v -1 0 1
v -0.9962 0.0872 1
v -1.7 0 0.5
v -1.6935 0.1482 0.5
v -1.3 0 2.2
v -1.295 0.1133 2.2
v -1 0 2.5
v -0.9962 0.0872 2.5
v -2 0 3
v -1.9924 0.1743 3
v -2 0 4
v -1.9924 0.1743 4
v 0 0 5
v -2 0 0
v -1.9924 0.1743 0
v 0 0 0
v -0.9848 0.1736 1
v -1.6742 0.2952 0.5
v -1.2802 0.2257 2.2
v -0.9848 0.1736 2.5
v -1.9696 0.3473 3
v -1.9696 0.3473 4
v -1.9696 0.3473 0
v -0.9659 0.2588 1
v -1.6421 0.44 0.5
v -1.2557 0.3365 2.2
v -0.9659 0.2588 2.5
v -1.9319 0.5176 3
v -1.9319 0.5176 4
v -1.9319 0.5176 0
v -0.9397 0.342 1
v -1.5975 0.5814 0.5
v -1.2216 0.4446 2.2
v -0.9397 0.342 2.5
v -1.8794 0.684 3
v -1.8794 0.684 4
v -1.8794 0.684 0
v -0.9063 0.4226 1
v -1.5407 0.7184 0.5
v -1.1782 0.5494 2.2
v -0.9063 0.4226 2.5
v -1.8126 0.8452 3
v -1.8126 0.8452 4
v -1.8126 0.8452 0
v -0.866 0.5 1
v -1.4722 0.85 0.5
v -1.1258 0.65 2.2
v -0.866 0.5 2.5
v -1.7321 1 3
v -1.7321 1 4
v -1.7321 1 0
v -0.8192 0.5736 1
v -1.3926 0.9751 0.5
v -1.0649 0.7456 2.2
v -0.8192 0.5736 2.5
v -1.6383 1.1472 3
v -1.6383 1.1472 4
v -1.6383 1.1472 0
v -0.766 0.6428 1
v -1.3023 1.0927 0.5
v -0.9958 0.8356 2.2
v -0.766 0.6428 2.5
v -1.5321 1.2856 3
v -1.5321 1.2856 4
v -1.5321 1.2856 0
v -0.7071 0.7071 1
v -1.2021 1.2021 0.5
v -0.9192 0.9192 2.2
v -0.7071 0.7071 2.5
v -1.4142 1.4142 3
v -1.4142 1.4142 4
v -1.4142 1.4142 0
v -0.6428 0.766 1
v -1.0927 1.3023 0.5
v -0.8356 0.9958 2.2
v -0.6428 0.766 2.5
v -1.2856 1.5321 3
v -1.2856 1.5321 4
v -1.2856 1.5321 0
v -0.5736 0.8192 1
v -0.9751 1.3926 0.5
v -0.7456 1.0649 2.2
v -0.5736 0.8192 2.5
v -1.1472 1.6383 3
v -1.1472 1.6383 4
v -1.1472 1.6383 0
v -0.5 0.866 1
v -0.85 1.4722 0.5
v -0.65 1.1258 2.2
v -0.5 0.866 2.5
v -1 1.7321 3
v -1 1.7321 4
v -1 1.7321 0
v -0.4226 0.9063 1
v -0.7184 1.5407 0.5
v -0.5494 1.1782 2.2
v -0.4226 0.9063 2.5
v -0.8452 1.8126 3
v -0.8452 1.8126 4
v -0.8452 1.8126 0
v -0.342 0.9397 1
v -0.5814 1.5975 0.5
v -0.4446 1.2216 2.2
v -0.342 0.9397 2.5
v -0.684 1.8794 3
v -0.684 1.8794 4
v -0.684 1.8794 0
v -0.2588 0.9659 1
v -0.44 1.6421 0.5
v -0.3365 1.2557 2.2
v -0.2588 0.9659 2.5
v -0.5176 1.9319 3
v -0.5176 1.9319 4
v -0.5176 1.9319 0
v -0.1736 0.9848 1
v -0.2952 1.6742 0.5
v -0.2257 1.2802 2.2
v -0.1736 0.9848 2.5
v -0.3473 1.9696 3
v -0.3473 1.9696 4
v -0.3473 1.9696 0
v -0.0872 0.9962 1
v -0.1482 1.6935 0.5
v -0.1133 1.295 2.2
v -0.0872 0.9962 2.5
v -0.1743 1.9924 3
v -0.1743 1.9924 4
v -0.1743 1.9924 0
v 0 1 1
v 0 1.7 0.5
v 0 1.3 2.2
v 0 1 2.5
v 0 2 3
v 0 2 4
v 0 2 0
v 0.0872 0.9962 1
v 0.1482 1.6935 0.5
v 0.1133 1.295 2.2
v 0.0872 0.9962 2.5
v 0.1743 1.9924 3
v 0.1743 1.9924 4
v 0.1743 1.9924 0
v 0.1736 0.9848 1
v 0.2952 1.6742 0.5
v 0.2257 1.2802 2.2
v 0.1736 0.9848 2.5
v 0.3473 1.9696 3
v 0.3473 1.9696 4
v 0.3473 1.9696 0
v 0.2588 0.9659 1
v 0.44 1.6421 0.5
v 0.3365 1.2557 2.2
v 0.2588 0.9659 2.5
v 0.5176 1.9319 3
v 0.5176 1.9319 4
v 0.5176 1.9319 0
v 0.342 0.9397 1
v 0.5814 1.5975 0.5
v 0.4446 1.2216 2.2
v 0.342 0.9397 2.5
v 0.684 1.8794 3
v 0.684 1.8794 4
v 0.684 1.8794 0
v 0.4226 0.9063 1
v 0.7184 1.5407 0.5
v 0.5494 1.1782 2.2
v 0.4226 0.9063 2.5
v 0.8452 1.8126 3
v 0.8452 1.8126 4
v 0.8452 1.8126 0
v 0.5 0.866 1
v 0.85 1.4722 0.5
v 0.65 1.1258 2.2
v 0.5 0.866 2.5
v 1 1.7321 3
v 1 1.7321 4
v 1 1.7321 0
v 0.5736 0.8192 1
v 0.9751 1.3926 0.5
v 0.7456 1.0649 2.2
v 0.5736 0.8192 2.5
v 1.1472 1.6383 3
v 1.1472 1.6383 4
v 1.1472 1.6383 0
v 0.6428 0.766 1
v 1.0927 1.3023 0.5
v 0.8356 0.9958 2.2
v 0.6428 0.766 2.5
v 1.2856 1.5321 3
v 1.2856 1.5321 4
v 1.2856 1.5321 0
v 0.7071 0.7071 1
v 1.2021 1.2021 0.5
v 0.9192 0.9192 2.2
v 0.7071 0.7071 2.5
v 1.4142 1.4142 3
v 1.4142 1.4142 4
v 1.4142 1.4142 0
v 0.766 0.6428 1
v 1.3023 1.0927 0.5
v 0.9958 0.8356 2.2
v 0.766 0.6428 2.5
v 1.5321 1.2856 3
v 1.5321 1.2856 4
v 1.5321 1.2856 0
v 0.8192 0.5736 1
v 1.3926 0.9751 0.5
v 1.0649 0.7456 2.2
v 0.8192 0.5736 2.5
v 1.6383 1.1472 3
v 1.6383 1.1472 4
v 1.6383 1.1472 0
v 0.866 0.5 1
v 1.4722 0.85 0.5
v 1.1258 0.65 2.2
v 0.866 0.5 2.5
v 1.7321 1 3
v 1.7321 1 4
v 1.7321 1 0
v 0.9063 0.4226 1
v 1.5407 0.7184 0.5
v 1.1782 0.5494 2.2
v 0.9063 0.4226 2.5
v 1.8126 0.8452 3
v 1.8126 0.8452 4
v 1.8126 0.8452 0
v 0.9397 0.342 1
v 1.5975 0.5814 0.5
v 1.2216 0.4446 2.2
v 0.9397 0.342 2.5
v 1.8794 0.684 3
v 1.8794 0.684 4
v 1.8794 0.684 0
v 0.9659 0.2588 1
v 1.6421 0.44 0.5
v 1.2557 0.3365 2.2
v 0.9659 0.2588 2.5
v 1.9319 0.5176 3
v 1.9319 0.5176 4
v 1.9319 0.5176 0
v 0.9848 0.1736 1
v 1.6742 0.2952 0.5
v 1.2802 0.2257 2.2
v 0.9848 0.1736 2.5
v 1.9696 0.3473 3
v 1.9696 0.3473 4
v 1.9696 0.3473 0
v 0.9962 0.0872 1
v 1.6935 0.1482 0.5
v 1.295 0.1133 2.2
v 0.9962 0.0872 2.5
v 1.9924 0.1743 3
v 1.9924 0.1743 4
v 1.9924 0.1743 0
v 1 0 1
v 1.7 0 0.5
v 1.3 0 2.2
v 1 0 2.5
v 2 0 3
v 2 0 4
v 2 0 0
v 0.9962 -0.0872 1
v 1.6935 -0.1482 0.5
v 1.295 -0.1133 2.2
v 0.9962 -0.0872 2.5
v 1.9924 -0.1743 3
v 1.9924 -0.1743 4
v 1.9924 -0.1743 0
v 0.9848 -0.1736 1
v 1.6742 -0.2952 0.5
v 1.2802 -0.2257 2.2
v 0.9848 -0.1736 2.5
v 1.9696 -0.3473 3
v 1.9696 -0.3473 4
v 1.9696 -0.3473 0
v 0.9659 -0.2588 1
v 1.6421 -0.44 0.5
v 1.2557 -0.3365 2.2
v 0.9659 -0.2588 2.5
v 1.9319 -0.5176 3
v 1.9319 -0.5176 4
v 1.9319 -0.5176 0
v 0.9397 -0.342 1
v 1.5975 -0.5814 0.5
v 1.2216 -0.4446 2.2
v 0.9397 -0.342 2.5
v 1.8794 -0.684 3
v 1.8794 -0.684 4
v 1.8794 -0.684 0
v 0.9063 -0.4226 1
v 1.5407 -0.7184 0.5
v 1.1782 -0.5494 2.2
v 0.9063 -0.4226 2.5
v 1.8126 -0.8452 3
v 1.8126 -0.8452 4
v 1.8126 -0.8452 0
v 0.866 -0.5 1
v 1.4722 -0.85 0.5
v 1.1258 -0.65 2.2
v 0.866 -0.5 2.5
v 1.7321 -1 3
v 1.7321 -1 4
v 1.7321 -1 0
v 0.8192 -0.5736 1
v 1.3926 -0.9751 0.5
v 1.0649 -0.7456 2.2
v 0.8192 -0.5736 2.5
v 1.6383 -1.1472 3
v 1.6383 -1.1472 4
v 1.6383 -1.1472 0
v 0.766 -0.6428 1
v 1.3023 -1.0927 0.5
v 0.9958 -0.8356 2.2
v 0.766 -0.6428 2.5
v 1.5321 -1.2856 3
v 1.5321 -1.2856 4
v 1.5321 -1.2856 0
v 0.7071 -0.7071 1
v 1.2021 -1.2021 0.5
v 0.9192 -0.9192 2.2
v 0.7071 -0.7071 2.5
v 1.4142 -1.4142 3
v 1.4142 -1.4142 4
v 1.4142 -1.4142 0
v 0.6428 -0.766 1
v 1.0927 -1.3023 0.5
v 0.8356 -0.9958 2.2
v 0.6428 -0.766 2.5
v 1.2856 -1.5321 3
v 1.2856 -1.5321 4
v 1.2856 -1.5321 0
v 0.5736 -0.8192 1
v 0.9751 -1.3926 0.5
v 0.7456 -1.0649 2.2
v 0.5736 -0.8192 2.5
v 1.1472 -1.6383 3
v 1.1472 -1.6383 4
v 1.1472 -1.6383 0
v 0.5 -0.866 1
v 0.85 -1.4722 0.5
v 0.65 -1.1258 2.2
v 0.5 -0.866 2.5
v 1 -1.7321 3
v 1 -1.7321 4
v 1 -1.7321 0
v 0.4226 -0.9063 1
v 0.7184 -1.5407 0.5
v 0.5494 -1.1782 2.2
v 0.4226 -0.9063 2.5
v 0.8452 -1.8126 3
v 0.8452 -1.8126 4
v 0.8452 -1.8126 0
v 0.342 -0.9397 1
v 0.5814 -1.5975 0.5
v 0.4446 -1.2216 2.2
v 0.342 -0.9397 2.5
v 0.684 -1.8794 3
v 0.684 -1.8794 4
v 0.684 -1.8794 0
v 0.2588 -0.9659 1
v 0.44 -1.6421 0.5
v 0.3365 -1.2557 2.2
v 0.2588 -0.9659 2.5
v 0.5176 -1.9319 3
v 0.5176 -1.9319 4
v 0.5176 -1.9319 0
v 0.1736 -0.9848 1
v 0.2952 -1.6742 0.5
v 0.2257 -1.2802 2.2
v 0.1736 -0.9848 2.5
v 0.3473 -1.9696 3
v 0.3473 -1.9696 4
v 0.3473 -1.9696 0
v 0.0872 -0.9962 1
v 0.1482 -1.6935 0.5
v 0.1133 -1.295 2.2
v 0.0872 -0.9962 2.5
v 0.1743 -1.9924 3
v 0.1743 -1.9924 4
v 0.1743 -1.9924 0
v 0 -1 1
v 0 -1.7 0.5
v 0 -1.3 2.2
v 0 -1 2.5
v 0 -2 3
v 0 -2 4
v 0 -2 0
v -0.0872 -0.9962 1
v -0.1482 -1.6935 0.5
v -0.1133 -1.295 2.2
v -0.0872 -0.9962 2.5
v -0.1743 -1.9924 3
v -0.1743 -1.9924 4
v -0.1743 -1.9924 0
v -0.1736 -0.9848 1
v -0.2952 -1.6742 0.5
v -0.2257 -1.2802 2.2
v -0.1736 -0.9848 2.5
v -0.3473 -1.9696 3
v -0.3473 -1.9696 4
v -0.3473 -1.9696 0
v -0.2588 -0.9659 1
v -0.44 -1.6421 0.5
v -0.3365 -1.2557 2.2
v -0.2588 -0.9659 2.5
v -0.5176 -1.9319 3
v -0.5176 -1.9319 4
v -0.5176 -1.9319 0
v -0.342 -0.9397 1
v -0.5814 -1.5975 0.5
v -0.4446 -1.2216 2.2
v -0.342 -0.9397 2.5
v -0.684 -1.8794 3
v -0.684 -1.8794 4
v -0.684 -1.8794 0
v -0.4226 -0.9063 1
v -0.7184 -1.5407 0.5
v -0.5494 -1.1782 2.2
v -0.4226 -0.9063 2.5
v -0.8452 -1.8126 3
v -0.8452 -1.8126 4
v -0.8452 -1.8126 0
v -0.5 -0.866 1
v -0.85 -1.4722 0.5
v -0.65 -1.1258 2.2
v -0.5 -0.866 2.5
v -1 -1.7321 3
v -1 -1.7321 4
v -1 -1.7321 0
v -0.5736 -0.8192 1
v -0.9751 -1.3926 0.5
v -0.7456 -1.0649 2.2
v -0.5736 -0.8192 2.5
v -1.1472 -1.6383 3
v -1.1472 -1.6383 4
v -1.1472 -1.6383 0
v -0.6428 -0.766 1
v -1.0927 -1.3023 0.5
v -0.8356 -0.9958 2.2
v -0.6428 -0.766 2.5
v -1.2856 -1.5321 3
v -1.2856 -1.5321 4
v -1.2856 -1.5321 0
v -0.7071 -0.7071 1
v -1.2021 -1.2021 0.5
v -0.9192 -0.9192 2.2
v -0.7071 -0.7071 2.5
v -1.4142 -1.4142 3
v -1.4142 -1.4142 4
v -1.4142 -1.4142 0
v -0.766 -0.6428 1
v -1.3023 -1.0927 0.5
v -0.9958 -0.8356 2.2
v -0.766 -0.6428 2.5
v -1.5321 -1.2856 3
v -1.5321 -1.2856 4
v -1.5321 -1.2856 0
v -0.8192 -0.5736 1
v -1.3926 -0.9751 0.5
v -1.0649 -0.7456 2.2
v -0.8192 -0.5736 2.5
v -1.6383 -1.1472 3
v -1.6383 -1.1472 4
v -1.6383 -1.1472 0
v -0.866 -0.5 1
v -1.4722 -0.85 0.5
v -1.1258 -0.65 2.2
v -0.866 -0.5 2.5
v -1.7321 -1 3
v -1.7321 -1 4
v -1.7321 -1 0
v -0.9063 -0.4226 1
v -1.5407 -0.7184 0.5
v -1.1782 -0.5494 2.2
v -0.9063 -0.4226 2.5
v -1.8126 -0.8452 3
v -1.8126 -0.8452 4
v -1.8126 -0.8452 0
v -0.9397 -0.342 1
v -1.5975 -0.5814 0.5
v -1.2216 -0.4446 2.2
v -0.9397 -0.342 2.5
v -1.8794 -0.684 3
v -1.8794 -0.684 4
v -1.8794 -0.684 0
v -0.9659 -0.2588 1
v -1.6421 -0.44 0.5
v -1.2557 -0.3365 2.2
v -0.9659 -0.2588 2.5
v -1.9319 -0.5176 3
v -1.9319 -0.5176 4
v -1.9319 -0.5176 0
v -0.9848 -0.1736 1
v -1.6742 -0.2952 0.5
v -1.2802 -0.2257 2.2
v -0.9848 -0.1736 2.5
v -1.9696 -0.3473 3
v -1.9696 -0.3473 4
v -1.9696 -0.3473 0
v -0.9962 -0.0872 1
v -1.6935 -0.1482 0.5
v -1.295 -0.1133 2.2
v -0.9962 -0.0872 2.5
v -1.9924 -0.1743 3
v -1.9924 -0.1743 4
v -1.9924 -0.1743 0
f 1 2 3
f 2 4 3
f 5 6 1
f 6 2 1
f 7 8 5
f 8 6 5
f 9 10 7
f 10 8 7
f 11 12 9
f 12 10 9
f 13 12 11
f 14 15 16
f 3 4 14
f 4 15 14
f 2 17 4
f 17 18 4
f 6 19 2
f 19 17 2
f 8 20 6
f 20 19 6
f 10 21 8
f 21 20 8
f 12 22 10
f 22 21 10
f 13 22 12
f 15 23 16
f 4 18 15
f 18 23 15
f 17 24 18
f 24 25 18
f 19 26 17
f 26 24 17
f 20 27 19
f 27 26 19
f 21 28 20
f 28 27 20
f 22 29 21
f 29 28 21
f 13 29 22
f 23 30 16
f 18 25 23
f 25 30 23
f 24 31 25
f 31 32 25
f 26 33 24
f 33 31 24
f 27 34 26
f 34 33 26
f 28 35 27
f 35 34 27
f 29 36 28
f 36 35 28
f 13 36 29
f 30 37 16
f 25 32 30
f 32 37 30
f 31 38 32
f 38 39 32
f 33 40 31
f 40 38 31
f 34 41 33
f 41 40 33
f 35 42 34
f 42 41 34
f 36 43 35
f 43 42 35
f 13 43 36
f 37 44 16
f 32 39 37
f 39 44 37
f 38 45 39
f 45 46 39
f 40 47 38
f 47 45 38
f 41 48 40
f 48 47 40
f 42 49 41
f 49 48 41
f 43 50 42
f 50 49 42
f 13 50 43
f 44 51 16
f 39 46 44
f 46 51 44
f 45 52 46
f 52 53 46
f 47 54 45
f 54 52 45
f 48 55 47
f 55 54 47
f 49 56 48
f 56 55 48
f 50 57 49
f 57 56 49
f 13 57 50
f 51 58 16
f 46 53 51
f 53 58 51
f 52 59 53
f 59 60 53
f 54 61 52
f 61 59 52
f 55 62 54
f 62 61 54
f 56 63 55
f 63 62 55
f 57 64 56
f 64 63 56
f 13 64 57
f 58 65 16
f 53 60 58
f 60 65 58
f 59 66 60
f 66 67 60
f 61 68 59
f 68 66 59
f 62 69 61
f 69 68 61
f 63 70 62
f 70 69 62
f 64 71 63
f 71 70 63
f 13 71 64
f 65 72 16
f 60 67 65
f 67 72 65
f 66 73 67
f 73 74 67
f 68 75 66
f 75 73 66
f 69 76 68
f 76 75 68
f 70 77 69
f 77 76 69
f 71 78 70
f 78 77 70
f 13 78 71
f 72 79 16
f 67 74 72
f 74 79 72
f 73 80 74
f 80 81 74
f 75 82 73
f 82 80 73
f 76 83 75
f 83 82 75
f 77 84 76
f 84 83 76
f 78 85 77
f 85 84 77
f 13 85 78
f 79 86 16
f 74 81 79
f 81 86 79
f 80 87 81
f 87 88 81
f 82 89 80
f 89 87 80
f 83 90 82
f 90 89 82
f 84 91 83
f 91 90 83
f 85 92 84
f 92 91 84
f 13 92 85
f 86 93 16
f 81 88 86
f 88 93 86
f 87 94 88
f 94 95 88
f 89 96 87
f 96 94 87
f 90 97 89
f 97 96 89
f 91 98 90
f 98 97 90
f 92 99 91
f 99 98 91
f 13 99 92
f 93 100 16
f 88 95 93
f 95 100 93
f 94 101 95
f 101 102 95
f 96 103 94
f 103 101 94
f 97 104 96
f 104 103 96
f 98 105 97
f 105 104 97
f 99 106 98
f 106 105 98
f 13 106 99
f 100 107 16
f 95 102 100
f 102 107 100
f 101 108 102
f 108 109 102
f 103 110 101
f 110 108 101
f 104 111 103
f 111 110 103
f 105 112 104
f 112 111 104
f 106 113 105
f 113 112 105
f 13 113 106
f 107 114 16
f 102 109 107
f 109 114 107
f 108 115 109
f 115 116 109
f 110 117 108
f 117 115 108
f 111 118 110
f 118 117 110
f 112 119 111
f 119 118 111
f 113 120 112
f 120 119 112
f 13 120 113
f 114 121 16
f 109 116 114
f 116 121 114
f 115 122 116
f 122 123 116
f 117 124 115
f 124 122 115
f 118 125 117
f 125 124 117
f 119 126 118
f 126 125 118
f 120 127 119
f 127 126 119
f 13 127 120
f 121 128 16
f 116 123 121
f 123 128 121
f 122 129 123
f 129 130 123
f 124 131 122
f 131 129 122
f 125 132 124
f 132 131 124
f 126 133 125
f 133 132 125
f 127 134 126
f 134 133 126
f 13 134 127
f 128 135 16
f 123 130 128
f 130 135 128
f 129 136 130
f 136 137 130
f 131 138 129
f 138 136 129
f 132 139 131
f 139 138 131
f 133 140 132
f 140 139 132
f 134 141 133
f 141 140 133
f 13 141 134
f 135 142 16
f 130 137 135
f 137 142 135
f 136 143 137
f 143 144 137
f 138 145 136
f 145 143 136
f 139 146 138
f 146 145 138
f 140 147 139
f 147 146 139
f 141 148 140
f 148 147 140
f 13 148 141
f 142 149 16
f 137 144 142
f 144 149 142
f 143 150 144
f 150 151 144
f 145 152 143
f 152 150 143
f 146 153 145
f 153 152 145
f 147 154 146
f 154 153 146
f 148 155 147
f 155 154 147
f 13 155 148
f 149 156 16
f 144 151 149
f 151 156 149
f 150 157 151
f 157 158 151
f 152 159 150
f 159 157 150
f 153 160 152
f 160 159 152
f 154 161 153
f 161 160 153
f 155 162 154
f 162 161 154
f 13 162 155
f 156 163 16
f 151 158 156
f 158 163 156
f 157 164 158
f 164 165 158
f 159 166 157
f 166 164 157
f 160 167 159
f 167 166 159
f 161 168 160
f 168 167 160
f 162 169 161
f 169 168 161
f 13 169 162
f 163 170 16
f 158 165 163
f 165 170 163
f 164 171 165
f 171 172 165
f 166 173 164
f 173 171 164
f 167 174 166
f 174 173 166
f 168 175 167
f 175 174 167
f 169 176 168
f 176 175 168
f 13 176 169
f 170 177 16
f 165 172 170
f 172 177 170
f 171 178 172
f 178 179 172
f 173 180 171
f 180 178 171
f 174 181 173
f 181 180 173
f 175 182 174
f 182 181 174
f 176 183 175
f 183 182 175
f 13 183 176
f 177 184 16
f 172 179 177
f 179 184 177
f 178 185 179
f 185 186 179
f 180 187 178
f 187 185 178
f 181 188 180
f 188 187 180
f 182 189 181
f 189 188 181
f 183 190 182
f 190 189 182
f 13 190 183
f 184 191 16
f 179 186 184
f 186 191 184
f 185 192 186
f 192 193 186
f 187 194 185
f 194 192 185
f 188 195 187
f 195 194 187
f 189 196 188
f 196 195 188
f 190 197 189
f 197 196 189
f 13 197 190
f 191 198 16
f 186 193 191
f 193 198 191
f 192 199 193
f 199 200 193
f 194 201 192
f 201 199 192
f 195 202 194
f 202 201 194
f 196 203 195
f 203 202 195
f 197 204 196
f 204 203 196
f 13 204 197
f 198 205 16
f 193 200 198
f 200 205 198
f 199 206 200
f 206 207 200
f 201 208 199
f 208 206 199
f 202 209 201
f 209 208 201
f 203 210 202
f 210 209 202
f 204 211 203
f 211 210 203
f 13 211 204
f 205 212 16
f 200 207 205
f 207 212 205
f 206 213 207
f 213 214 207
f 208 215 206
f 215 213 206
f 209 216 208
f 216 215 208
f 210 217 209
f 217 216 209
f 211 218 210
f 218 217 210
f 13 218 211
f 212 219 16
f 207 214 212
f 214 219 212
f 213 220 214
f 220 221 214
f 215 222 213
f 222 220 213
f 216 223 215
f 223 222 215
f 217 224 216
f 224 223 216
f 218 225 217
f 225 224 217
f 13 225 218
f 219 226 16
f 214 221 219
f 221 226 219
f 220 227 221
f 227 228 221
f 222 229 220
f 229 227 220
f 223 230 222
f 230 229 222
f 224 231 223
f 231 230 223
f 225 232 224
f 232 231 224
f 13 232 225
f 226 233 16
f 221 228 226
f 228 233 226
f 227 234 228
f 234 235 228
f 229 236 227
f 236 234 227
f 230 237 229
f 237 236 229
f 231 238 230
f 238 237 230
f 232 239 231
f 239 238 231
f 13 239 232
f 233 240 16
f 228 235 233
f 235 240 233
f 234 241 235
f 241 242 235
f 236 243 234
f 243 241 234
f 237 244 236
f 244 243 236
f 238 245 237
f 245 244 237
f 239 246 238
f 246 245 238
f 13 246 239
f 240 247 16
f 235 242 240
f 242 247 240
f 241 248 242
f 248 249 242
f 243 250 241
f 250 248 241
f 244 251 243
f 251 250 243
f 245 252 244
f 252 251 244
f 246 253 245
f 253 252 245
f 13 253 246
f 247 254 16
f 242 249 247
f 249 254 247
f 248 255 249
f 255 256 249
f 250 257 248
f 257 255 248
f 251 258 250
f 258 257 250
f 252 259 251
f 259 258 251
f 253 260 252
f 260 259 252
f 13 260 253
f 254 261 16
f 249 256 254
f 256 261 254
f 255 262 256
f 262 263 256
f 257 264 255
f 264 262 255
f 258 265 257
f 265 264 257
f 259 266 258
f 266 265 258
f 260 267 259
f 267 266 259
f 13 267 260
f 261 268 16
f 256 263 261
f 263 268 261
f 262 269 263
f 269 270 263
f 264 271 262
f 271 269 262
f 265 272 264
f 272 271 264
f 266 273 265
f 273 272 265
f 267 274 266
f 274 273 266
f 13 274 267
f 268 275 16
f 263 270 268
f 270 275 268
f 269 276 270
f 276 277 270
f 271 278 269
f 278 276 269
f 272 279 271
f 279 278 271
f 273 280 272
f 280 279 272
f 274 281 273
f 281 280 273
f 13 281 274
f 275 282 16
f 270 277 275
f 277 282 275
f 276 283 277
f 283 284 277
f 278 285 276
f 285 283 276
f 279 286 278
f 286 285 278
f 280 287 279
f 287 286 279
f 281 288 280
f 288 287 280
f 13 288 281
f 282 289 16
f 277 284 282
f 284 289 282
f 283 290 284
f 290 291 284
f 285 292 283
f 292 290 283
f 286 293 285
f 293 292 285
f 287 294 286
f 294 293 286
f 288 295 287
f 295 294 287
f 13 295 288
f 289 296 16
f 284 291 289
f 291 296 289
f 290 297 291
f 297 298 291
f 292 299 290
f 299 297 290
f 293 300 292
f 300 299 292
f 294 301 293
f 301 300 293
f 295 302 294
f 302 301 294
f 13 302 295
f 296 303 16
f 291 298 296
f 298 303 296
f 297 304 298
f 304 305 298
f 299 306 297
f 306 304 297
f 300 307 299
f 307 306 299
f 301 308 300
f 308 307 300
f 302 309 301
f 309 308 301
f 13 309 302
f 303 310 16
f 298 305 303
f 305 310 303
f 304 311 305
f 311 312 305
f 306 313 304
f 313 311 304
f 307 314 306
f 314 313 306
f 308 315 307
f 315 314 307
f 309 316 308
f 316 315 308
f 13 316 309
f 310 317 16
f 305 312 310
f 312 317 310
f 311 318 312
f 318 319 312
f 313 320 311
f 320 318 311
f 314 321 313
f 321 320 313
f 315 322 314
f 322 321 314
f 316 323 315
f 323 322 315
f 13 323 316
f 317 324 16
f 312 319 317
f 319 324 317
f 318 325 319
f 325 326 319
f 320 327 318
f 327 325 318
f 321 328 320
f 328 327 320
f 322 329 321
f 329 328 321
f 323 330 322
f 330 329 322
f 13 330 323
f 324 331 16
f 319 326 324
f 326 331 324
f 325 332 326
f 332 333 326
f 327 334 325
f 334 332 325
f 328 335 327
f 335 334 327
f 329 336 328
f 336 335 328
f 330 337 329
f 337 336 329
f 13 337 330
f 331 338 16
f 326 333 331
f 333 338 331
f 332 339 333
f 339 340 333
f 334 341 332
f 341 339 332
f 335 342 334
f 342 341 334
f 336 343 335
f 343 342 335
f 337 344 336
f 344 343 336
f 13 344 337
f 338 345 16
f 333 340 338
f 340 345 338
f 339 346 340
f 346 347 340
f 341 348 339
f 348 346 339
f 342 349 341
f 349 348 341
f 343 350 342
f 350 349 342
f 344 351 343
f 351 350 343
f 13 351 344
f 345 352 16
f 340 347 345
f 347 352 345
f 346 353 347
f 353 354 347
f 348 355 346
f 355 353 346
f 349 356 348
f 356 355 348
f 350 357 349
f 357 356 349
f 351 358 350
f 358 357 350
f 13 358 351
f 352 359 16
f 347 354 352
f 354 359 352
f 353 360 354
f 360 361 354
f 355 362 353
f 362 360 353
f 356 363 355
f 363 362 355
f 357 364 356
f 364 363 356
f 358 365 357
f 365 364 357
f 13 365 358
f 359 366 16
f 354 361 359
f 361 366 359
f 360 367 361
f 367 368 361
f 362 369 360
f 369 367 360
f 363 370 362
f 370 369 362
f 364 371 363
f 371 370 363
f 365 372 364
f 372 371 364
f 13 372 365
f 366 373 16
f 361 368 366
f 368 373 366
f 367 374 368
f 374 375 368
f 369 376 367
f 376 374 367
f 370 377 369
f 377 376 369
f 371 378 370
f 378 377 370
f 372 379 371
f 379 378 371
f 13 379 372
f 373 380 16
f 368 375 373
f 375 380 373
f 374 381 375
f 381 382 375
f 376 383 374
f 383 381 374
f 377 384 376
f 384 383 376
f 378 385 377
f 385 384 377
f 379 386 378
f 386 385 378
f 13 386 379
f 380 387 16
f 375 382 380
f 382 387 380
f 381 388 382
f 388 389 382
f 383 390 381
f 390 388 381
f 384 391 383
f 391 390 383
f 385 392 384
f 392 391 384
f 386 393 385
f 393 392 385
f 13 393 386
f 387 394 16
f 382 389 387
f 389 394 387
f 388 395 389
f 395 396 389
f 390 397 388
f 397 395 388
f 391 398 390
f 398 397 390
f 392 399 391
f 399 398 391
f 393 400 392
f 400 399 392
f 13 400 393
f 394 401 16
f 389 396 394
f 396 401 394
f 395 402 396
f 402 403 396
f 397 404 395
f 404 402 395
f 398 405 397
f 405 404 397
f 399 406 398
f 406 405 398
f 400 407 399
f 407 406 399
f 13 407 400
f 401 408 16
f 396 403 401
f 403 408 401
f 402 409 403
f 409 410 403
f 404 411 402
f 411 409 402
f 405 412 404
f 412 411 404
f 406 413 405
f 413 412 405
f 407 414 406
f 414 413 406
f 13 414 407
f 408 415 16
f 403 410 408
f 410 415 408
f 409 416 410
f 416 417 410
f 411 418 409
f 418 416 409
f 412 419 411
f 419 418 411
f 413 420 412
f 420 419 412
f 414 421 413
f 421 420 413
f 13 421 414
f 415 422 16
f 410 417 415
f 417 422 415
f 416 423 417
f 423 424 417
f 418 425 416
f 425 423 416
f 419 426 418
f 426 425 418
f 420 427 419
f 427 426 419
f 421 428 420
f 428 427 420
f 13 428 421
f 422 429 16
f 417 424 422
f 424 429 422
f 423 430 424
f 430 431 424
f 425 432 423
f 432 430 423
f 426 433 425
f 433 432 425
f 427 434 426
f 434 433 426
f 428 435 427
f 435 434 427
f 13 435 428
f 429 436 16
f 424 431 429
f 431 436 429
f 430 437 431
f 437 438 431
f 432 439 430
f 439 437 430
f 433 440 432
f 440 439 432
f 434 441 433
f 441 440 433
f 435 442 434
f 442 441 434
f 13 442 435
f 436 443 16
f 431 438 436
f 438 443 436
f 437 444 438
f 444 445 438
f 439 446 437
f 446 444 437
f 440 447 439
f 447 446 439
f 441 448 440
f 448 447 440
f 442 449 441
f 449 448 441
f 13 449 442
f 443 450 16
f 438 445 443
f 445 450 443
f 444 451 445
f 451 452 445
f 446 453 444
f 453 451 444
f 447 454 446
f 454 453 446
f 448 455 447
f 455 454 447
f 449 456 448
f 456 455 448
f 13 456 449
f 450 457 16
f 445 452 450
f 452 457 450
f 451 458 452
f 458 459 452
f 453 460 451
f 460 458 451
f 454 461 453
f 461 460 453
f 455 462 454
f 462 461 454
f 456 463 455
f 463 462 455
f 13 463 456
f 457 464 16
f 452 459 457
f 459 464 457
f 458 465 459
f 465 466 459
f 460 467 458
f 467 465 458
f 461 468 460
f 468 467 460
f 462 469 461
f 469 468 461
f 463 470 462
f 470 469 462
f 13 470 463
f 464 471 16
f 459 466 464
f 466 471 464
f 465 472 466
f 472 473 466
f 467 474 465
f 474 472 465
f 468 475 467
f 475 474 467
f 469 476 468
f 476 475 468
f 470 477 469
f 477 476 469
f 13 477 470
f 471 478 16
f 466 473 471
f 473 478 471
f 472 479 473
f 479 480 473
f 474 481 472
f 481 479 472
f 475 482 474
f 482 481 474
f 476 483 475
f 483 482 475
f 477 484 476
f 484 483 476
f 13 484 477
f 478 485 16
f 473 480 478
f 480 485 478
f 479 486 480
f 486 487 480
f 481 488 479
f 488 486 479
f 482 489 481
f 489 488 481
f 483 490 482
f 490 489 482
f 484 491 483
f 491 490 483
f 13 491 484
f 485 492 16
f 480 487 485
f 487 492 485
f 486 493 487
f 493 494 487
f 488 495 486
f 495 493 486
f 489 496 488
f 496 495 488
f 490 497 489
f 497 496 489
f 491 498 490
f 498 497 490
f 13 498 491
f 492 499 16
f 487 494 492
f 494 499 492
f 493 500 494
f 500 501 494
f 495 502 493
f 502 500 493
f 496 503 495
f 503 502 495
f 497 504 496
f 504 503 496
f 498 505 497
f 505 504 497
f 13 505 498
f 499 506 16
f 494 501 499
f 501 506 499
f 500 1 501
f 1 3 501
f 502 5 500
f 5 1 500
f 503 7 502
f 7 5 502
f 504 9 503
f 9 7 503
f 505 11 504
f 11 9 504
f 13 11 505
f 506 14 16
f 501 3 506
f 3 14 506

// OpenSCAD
//=============================================================================
// Icon used for creating a surface of revolution model.
//=============================================================================

module CreateRevSurfIcon() {
  points=[[0,0],
          [2,0],
          [1.7,.5],
          [1,1],
          [1.3,2.2],
          [1,2.5],
          [2,3],
          [2,4],
          [0,5]];

  rotate_extrude() polygon(points);
}

CreateRevSurfIcon($fn=72);
